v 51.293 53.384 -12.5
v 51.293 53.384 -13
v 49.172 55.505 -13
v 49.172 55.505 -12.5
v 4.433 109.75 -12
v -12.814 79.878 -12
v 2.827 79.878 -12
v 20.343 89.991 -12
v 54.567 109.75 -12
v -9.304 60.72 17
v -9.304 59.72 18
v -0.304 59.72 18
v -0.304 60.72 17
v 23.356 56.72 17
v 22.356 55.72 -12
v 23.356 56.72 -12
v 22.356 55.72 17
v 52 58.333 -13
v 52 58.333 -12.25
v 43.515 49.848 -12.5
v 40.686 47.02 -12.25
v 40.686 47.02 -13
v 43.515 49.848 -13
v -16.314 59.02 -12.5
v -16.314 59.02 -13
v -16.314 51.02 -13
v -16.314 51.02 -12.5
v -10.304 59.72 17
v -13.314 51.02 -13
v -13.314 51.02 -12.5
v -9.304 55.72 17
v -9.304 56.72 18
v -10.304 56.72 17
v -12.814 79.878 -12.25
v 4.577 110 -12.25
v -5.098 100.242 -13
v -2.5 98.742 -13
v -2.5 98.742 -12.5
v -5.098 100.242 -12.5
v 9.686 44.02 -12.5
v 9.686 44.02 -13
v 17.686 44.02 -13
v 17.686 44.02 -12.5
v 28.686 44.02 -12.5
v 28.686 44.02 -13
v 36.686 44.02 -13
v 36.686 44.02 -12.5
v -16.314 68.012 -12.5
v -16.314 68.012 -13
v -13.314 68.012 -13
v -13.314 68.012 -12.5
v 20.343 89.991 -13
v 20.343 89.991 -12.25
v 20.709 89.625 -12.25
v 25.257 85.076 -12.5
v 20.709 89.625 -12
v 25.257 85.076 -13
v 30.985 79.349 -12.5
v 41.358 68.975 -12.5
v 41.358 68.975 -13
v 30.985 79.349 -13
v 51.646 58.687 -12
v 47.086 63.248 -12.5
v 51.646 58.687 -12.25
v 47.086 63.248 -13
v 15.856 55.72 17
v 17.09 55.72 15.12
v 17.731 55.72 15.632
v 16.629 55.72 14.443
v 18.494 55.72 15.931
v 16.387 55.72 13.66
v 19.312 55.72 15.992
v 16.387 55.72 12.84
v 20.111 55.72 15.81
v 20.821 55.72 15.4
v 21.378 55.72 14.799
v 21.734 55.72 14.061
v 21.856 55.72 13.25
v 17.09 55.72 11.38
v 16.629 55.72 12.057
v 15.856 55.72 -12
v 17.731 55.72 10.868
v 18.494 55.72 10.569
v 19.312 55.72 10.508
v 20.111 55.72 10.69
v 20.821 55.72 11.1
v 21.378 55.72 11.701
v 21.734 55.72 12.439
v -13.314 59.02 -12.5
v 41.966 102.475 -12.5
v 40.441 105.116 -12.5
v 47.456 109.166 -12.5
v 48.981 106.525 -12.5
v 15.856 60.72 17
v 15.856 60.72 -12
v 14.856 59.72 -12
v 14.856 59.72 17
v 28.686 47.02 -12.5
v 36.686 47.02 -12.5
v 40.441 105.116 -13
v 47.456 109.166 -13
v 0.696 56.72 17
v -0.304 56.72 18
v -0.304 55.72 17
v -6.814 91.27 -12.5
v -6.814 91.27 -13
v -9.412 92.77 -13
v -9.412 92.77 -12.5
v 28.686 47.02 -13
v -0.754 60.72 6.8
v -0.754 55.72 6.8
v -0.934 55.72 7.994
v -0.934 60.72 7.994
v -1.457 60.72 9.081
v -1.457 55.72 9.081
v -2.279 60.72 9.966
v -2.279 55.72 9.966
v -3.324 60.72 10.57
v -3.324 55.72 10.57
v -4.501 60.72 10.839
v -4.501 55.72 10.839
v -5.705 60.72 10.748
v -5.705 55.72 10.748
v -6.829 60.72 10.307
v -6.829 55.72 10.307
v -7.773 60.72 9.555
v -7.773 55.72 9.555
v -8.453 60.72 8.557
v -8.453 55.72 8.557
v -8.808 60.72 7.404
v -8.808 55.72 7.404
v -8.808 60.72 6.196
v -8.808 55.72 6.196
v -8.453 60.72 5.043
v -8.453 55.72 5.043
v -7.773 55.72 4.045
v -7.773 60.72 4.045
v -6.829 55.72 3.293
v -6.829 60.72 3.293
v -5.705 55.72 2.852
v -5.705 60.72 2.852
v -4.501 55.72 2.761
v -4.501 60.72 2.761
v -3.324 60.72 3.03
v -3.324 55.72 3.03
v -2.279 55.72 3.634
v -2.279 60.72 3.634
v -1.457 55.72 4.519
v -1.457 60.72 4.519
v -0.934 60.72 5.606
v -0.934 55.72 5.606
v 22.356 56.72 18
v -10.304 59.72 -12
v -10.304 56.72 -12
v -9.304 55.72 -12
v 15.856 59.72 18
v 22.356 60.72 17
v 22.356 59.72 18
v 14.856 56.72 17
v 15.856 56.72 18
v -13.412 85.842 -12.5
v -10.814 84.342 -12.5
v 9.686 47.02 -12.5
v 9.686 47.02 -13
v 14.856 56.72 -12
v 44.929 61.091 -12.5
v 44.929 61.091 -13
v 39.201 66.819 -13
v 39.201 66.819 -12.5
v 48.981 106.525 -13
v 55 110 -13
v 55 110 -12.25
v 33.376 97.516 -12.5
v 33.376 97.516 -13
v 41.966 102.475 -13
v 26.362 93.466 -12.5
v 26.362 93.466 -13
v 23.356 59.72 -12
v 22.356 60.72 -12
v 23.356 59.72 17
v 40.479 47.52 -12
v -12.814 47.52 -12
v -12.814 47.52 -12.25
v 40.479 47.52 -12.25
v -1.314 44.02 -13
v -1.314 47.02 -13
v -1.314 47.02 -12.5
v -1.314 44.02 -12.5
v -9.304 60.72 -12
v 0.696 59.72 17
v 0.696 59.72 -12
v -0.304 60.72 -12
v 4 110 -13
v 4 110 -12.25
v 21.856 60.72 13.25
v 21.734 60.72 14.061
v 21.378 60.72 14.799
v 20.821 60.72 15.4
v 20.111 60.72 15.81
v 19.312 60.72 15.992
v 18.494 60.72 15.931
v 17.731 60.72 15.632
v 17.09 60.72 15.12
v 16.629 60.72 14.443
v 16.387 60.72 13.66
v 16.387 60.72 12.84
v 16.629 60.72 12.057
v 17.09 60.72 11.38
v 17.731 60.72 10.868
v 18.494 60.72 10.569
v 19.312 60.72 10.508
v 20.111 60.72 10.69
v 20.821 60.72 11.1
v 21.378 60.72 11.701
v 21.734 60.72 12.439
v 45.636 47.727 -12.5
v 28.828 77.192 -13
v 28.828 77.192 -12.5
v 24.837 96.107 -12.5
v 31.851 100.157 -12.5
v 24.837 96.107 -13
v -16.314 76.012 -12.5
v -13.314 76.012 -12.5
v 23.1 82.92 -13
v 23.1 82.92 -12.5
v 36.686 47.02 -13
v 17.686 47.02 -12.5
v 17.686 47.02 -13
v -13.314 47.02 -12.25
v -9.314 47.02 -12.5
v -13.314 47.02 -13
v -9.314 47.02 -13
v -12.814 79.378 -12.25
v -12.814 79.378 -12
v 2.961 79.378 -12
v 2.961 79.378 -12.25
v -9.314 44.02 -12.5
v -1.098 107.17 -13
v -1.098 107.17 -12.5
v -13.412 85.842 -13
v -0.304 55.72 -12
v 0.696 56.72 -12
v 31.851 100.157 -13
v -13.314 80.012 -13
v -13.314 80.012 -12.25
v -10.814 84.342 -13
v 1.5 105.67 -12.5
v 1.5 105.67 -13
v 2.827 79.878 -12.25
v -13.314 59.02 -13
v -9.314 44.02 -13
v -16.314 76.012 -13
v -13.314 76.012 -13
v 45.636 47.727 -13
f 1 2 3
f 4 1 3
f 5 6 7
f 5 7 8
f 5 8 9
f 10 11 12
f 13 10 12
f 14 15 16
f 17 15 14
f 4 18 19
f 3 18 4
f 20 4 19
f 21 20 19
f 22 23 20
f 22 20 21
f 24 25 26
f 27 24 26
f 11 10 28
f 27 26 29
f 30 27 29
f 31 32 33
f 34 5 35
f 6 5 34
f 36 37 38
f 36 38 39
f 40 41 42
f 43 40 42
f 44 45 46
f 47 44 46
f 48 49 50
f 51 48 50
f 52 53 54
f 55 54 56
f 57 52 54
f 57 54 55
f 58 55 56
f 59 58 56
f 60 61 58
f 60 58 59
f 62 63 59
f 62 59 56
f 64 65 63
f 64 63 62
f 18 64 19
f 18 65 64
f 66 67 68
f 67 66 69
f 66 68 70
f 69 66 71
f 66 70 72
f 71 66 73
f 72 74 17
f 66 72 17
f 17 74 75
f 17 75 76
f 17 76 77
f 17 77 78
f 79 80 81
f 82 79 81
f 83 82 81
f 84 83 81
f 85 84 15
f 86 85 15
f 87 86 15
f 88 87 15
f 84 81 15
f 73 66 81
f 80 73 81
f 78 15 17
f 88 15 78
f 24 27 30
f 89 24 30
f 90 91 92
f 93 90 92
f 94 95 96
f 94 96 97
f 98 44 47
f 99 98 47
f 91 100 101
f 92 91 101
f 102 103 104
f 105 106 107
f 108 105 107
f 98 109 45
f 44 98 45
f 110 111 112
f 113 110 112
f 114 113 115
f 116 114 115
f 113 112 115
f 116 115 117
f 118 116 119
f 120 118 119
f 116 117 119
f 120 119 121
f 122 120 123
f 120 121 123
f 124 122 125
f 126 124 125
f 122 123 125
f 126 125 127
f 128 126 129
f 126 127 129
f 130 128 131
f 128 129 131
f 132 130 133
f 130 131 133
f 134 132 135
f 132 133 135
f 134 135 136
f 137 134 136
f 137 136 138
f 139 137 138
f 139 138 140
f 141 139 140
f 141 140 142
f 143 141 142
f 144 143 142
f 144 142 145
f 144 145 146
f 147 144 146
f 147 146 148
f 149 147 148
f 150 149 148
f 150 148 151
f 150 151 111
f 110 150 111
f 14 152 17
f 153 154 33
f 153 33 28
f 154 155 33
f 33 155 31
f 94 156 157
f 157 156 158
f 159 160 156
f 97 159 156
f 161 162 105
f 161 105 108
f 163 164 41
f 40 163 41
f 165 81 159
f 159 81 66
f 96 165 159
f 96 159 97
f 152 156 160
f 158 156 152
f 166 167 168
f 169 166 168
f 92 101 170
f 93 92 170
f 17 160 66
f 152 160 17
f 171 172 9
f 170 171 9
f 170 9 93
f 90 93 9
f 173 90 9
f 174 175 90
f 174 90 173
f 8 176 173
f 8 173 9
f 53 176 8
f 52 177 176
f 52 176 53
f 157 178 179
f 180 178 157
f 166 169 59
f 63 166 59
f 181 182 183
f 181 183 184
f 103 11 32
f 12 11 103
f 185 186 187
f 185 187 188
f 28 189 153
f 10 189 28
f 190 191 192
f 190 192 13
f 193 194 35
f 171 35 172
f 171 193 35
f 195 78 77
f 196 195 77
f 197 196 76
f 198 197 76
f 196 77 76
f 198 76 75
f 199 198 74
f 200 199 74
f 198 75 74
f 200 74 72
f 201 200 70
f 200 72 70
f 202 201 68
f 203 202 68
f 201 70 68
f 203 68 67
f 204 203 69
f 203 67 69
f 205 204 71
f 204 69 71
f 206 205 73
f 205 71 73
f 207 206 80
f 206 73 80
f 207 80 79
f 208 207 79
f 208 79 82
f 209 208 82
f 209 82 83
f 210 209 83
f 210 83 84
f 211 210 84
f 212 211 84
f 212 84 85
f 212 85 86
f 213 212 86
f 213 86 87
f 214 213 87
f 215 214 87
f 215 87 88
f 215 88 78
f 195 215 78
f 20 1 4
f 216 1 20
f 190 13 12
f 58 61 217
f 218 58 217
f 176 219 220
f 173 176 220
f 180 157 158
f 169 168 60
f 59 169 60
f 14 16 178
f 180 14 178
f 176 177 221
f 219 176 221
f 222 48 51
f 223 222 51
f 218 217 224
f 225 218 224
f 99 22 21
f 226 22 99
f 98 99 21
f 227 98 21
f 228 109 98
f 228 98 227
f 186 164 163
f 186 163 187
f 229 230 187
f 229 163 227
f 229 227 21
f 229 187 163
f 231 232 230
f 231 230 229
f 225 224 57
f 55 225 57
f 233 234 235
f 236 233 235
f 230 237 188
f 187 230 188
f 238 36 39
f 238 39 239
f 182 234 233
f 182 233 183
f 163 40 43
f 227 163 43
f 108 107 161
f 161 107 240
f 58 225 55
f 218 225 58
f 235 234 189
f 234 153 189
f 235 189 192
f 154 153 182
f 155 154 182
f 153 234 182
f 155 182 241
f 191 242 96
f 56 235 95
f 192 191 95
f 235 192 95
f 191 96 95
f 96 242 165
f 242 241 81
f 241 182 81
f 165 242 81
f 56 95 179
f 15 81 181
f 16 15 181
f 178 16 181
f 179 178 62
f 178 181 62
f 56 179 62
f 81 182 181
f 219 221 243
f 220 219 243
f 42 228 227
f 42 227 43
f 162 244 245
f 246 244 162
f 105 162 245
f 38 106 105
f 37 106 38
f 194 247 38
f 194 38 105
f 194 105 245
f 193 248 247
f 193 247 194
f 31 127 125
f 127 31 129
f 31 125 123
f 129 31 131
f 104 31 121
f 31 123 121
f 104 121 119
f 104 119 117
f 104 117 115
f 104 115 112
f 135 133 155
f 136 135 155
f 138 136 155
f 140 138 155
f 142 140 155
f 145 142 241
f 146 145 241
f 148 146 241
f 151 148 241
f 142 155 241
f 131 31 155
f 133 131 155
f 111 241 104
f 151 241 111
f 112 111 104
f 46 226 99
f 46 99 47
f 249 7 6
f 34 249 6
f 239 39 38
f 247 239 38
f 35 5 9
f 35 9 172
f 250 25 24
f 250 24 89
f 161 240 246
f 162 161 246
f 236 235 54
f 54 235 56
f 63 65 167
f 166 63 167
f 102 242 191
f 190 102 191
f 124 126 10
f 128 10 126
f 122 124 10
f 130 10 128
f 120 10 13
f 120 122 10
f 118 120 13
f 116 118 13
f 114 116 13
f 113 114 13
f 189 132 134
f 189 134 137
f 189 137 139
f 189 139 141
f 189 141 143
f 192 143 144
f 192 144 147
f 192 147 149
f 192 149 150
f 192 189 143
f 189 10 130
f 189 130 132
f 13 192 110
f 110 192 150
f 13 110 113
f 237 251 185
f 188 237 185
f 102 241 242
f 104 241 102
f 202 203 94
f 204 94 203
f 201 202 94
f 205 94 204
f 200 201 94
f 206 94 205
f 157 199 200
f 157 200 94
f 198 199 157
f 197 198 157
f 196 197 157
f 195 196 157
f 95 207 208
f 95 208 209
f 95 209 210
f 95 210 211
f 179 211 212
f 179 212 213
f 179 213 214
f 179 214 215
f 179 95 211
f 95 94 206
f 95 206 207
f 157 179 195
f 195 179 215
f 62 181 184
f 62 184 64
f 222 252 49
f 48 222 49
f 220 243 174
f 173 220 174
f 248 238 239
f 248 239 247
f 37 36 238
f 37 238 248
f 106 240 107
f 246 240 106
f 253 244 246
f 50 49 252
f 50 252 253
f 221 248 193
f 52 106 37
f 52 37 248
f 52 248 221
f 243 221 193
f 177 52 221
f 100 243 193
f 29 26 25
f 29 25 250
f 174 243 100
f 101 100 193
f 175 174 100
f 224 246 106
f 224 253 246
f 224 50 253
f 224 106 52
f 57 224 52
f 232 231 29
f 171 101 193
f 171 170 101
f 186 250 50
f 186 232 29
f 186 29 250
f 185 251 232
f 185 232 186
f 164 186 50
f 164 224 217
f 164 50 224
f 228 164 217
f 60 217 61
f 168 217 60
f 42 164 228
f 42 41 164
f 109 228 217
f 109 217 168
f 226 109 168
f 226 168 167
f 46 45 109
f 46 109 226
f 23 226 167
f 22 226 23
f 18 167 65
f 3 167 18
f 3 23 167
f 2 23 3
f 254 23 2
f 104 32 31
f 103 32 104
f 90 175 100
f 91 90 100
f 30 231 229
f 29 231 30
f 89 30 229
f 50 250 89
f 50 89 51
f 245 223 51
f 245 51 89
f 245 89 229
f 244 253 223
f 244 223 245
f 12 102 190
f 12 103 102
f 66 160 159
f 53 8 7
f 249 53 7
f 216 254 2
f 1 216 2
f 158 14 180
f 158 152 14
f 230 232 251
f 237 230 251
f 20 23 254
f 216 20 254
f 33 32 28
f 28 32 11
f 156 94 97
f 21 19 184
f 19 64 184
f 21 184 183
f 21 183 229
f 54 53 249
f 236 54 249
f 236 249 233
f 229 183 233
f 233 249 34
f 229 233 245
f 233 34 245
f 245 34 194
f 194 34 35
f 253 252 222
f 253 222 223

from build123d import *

# Parameters (mm, degrees)
PAD002_DEPTH    = 1
POCKET002_DEPTH = 0.5
POCKET003_DEPTH = 0.25
POCKET004_DEPTH = 0.25
SKETCH009_W     = 8.5
SKETCH009_H     = 5
SKETCH009_W_2   = 11
PAD003_DEPTH    = 30
SKETCH010_R     = 4.05
SKETCH010_R_2   = 2.75
POCKET005_DEPTH = 54.281375499
SKETCH011_W     = 8
SKETCH011_H     = 3
SKETCH011_W_2   = 3
SKETCH011_H_2   = 8
PAD004_DEPTH    = 0.5
CHAMFER001_SIZE = 0.25
CHAMFER002_SIZE = 1


with BuildPart() as part:
    # Sketch005 (on Face1 of Binder) → Pad002 (new body)
    with BuildSketch(Plane(origin=(0, 0, -13), x_dir=(1, 0, 0), z_dir=(0, 0, -1))):
        Polygon((52, -58.333333), (40.686291501, -47.019624501), (-13.313708499, -47.019624501), (-13.313708499, -80.0117772123), (4, -110), (55, -110), (20.3427218622, -89.9906111378), align=None)
    extrude(amount=-PAD002_DEPTH)

    # Sketch006 (on Face8 of Pad002) → Pocket002 (cut)
    with BuildSketch(Plane(origin=(0, 0, -13), x_dir=(1, 0, 0), z_dir=(0, 0, -1))):
        Polygon((47.0856078708, -63.2477251292), (44.9289321881, -61.0910494466), (39.2013672605, -66.8186143742), (41.3580429431, -68.9752900569), align=None)
        Polygon((30.9846789191, -79.3486540809), (28.8280032365, -77.1919783983), (23.1004383089, -82.9195433259), (25.2571139915, -85.0762190085), align=None)
        Polygon((26.3615984185, -93.4656111378), (24.8365984185, -96.1069886193), (31.8514041892, -100.1569886193), (33.3764041892, -97.5156111378), align=None)
        Polygon((48.9811234437, -106.525), (41.966317673, -102.475), (40.441317673, -105.1163774815), (47.4561234437, -109.1663774815), align=None)
    extrude(amount=-POCKET002_DEPTH, mode=Mode.SUBTRACT)

    # Sketch007 (on Face5 of Pocket002) → Pocket003 (cut)
    with BuildSketch(Plane.XY.offset(-12)):
        Polygon((52, 58.333333), (40.686291501, 47.019624501), (-13.313708499, 47.019624501), (-13.313708499, 80.0117772123), (4, 110), (4.5773502692, 110), (-12.813708499, 79.8778026161), (-12.813708499, 47.519624501), (40.4791847198, 47.519624501), (51.6464466094, 58.6868863906), align=None)
    extrude(amount=-POCKET003_DEPTH, mode=Mode.SUBTRACT)

    # Sketch008 (on Face28 of Pocket003) → Pocket004 (cut)
    with BuildSketch(Plane.XY.offset(-12)):
        Polygon((20.3427218622, 89.9906111378), (2.8268236955, 79.8778026161), (-12.813708499, 79.8778026161), (-12.813708499, 79.3778026161), (2.9607982917, 79.3778026161), (20.708747266, 89.624585734), align=None)
    extrude(amount=-POCKET004_DEPTH, mode=Mode.SUBTRACT)

    # Sketch009 (on Face27 of Pocket004) → Pad003 (join)
    with BuildSketch(Plane.XY.offset(-12)):
        with Locations((19.106291501, 58.219624501)):
            Rectangle(SKETCH009_W, SKETCH009_H)
        with Locations((-4.803708499, 58.219624501)):
            Rectangle(SKETCH009_W_2, SKETCH009_H)
    extrude(amount=PAD003_DEPTH)

    # Sketch010 (on Face11 of Pad003) → Pocket005 (cut, through all)
    with BuildSketch(Plane.XZ.offset(-55.719624501)):
        with Locations((-4.803708499, 6.8)):
            Circle(SKETCH010_R)
        with Locations((19.106291501, 13.25)):
            Circle(SKETCH010_R_2)
    extrude(amount=-POCKET005_DEPTH, mode=Mode.SUBTRACT)

    # Sketch011 (on Face25 of Pocket005) → Pad004 (join)
    with BuildSketch(Plane(origin=(0, 0, -13), x_dir=(1, 0, 0), z_dir=(0, 0, -1))):
        with Locations((-5.313708499, -45.519624501)):
            Rectangle(SKETCH011_W, SKETCH011_H)
        with Locations((13.686291501, -45.519624501)):
            Rectangle(SKETCH011_W, SKETCH011_H)
        with Locations((32.686291501, -45.519624501)):
            Rectangle(SKETCH011_W, SKETCH011_H)
        with Locations((-14.813708499, -55.019624501)):
            Rectangle(SKETCH011_W_2, SKETCH011_H_2)
        with Locations((-14.813708499, -72.0117772123)):
            Rectangle(SKETCH011_W_2, SKETCH011_H_2)
        Polygon((-10.813708499, -84.3419042312), (-6.813708499, -91.2701074615), (-9.4117847103, -92.7701074615), (-13.4117847103, -85.8419042312), align=None)
        Polygon((-2.5, -98.7416697508), (-5.0980762114, -100.2416697508), (-1.0980762114, -107.1698729811), (1.5, -105.6698729811), align=None)
        Polygon((49.1715728753, -55.5049058753), (43.5147186258, -49.8480516258), (45.6360389693, -47.7267312822), (51.2928932188, -53.3835855317), align=None)
    extrude(amount=-PAD004_DEPTH)

    # Chamfer001
    chamfer001_edges = [part.edges().sort_by_distance(p)[0] for p in [
        (29.788675, 110, -12),
    ]]
    chamfer(chamfer001_edges, length=CHAMFER001_SIZE)

    # Chamfer002
    chamfer002_edges = [part.edges().sort_by_distance(p)[0] for p in [
        (-10.303708, 60.719625, 3),
        (-4.803708, 60.719625, 18),
        (0.696292, 60.719625, 3),
        (0.696292, 58.219625, 18),
        (-4.803708, 55.719625, 18),
        (-10.303708, 58.219625, 18),
        (14.856292, 60.719625, 3),
        (23.356292, 60.719625, 3),
        (19.106292, 60.719625, 18),
        (23.356292, 58.219625, 18),
        (19.106292, 55.719625, 18),
        (14.856292, 58.219625, 18),
        (-10.303708, 55.719625, 3),
        (0.696292, 55.719625, 3),
        (14.856292, 55.719625, 3),
        (23.356292, 55.719625, 3),
    ]]
    chamfer(chamfer002_edges, length=CHAMFER002_SIZE)


solid = part.part
